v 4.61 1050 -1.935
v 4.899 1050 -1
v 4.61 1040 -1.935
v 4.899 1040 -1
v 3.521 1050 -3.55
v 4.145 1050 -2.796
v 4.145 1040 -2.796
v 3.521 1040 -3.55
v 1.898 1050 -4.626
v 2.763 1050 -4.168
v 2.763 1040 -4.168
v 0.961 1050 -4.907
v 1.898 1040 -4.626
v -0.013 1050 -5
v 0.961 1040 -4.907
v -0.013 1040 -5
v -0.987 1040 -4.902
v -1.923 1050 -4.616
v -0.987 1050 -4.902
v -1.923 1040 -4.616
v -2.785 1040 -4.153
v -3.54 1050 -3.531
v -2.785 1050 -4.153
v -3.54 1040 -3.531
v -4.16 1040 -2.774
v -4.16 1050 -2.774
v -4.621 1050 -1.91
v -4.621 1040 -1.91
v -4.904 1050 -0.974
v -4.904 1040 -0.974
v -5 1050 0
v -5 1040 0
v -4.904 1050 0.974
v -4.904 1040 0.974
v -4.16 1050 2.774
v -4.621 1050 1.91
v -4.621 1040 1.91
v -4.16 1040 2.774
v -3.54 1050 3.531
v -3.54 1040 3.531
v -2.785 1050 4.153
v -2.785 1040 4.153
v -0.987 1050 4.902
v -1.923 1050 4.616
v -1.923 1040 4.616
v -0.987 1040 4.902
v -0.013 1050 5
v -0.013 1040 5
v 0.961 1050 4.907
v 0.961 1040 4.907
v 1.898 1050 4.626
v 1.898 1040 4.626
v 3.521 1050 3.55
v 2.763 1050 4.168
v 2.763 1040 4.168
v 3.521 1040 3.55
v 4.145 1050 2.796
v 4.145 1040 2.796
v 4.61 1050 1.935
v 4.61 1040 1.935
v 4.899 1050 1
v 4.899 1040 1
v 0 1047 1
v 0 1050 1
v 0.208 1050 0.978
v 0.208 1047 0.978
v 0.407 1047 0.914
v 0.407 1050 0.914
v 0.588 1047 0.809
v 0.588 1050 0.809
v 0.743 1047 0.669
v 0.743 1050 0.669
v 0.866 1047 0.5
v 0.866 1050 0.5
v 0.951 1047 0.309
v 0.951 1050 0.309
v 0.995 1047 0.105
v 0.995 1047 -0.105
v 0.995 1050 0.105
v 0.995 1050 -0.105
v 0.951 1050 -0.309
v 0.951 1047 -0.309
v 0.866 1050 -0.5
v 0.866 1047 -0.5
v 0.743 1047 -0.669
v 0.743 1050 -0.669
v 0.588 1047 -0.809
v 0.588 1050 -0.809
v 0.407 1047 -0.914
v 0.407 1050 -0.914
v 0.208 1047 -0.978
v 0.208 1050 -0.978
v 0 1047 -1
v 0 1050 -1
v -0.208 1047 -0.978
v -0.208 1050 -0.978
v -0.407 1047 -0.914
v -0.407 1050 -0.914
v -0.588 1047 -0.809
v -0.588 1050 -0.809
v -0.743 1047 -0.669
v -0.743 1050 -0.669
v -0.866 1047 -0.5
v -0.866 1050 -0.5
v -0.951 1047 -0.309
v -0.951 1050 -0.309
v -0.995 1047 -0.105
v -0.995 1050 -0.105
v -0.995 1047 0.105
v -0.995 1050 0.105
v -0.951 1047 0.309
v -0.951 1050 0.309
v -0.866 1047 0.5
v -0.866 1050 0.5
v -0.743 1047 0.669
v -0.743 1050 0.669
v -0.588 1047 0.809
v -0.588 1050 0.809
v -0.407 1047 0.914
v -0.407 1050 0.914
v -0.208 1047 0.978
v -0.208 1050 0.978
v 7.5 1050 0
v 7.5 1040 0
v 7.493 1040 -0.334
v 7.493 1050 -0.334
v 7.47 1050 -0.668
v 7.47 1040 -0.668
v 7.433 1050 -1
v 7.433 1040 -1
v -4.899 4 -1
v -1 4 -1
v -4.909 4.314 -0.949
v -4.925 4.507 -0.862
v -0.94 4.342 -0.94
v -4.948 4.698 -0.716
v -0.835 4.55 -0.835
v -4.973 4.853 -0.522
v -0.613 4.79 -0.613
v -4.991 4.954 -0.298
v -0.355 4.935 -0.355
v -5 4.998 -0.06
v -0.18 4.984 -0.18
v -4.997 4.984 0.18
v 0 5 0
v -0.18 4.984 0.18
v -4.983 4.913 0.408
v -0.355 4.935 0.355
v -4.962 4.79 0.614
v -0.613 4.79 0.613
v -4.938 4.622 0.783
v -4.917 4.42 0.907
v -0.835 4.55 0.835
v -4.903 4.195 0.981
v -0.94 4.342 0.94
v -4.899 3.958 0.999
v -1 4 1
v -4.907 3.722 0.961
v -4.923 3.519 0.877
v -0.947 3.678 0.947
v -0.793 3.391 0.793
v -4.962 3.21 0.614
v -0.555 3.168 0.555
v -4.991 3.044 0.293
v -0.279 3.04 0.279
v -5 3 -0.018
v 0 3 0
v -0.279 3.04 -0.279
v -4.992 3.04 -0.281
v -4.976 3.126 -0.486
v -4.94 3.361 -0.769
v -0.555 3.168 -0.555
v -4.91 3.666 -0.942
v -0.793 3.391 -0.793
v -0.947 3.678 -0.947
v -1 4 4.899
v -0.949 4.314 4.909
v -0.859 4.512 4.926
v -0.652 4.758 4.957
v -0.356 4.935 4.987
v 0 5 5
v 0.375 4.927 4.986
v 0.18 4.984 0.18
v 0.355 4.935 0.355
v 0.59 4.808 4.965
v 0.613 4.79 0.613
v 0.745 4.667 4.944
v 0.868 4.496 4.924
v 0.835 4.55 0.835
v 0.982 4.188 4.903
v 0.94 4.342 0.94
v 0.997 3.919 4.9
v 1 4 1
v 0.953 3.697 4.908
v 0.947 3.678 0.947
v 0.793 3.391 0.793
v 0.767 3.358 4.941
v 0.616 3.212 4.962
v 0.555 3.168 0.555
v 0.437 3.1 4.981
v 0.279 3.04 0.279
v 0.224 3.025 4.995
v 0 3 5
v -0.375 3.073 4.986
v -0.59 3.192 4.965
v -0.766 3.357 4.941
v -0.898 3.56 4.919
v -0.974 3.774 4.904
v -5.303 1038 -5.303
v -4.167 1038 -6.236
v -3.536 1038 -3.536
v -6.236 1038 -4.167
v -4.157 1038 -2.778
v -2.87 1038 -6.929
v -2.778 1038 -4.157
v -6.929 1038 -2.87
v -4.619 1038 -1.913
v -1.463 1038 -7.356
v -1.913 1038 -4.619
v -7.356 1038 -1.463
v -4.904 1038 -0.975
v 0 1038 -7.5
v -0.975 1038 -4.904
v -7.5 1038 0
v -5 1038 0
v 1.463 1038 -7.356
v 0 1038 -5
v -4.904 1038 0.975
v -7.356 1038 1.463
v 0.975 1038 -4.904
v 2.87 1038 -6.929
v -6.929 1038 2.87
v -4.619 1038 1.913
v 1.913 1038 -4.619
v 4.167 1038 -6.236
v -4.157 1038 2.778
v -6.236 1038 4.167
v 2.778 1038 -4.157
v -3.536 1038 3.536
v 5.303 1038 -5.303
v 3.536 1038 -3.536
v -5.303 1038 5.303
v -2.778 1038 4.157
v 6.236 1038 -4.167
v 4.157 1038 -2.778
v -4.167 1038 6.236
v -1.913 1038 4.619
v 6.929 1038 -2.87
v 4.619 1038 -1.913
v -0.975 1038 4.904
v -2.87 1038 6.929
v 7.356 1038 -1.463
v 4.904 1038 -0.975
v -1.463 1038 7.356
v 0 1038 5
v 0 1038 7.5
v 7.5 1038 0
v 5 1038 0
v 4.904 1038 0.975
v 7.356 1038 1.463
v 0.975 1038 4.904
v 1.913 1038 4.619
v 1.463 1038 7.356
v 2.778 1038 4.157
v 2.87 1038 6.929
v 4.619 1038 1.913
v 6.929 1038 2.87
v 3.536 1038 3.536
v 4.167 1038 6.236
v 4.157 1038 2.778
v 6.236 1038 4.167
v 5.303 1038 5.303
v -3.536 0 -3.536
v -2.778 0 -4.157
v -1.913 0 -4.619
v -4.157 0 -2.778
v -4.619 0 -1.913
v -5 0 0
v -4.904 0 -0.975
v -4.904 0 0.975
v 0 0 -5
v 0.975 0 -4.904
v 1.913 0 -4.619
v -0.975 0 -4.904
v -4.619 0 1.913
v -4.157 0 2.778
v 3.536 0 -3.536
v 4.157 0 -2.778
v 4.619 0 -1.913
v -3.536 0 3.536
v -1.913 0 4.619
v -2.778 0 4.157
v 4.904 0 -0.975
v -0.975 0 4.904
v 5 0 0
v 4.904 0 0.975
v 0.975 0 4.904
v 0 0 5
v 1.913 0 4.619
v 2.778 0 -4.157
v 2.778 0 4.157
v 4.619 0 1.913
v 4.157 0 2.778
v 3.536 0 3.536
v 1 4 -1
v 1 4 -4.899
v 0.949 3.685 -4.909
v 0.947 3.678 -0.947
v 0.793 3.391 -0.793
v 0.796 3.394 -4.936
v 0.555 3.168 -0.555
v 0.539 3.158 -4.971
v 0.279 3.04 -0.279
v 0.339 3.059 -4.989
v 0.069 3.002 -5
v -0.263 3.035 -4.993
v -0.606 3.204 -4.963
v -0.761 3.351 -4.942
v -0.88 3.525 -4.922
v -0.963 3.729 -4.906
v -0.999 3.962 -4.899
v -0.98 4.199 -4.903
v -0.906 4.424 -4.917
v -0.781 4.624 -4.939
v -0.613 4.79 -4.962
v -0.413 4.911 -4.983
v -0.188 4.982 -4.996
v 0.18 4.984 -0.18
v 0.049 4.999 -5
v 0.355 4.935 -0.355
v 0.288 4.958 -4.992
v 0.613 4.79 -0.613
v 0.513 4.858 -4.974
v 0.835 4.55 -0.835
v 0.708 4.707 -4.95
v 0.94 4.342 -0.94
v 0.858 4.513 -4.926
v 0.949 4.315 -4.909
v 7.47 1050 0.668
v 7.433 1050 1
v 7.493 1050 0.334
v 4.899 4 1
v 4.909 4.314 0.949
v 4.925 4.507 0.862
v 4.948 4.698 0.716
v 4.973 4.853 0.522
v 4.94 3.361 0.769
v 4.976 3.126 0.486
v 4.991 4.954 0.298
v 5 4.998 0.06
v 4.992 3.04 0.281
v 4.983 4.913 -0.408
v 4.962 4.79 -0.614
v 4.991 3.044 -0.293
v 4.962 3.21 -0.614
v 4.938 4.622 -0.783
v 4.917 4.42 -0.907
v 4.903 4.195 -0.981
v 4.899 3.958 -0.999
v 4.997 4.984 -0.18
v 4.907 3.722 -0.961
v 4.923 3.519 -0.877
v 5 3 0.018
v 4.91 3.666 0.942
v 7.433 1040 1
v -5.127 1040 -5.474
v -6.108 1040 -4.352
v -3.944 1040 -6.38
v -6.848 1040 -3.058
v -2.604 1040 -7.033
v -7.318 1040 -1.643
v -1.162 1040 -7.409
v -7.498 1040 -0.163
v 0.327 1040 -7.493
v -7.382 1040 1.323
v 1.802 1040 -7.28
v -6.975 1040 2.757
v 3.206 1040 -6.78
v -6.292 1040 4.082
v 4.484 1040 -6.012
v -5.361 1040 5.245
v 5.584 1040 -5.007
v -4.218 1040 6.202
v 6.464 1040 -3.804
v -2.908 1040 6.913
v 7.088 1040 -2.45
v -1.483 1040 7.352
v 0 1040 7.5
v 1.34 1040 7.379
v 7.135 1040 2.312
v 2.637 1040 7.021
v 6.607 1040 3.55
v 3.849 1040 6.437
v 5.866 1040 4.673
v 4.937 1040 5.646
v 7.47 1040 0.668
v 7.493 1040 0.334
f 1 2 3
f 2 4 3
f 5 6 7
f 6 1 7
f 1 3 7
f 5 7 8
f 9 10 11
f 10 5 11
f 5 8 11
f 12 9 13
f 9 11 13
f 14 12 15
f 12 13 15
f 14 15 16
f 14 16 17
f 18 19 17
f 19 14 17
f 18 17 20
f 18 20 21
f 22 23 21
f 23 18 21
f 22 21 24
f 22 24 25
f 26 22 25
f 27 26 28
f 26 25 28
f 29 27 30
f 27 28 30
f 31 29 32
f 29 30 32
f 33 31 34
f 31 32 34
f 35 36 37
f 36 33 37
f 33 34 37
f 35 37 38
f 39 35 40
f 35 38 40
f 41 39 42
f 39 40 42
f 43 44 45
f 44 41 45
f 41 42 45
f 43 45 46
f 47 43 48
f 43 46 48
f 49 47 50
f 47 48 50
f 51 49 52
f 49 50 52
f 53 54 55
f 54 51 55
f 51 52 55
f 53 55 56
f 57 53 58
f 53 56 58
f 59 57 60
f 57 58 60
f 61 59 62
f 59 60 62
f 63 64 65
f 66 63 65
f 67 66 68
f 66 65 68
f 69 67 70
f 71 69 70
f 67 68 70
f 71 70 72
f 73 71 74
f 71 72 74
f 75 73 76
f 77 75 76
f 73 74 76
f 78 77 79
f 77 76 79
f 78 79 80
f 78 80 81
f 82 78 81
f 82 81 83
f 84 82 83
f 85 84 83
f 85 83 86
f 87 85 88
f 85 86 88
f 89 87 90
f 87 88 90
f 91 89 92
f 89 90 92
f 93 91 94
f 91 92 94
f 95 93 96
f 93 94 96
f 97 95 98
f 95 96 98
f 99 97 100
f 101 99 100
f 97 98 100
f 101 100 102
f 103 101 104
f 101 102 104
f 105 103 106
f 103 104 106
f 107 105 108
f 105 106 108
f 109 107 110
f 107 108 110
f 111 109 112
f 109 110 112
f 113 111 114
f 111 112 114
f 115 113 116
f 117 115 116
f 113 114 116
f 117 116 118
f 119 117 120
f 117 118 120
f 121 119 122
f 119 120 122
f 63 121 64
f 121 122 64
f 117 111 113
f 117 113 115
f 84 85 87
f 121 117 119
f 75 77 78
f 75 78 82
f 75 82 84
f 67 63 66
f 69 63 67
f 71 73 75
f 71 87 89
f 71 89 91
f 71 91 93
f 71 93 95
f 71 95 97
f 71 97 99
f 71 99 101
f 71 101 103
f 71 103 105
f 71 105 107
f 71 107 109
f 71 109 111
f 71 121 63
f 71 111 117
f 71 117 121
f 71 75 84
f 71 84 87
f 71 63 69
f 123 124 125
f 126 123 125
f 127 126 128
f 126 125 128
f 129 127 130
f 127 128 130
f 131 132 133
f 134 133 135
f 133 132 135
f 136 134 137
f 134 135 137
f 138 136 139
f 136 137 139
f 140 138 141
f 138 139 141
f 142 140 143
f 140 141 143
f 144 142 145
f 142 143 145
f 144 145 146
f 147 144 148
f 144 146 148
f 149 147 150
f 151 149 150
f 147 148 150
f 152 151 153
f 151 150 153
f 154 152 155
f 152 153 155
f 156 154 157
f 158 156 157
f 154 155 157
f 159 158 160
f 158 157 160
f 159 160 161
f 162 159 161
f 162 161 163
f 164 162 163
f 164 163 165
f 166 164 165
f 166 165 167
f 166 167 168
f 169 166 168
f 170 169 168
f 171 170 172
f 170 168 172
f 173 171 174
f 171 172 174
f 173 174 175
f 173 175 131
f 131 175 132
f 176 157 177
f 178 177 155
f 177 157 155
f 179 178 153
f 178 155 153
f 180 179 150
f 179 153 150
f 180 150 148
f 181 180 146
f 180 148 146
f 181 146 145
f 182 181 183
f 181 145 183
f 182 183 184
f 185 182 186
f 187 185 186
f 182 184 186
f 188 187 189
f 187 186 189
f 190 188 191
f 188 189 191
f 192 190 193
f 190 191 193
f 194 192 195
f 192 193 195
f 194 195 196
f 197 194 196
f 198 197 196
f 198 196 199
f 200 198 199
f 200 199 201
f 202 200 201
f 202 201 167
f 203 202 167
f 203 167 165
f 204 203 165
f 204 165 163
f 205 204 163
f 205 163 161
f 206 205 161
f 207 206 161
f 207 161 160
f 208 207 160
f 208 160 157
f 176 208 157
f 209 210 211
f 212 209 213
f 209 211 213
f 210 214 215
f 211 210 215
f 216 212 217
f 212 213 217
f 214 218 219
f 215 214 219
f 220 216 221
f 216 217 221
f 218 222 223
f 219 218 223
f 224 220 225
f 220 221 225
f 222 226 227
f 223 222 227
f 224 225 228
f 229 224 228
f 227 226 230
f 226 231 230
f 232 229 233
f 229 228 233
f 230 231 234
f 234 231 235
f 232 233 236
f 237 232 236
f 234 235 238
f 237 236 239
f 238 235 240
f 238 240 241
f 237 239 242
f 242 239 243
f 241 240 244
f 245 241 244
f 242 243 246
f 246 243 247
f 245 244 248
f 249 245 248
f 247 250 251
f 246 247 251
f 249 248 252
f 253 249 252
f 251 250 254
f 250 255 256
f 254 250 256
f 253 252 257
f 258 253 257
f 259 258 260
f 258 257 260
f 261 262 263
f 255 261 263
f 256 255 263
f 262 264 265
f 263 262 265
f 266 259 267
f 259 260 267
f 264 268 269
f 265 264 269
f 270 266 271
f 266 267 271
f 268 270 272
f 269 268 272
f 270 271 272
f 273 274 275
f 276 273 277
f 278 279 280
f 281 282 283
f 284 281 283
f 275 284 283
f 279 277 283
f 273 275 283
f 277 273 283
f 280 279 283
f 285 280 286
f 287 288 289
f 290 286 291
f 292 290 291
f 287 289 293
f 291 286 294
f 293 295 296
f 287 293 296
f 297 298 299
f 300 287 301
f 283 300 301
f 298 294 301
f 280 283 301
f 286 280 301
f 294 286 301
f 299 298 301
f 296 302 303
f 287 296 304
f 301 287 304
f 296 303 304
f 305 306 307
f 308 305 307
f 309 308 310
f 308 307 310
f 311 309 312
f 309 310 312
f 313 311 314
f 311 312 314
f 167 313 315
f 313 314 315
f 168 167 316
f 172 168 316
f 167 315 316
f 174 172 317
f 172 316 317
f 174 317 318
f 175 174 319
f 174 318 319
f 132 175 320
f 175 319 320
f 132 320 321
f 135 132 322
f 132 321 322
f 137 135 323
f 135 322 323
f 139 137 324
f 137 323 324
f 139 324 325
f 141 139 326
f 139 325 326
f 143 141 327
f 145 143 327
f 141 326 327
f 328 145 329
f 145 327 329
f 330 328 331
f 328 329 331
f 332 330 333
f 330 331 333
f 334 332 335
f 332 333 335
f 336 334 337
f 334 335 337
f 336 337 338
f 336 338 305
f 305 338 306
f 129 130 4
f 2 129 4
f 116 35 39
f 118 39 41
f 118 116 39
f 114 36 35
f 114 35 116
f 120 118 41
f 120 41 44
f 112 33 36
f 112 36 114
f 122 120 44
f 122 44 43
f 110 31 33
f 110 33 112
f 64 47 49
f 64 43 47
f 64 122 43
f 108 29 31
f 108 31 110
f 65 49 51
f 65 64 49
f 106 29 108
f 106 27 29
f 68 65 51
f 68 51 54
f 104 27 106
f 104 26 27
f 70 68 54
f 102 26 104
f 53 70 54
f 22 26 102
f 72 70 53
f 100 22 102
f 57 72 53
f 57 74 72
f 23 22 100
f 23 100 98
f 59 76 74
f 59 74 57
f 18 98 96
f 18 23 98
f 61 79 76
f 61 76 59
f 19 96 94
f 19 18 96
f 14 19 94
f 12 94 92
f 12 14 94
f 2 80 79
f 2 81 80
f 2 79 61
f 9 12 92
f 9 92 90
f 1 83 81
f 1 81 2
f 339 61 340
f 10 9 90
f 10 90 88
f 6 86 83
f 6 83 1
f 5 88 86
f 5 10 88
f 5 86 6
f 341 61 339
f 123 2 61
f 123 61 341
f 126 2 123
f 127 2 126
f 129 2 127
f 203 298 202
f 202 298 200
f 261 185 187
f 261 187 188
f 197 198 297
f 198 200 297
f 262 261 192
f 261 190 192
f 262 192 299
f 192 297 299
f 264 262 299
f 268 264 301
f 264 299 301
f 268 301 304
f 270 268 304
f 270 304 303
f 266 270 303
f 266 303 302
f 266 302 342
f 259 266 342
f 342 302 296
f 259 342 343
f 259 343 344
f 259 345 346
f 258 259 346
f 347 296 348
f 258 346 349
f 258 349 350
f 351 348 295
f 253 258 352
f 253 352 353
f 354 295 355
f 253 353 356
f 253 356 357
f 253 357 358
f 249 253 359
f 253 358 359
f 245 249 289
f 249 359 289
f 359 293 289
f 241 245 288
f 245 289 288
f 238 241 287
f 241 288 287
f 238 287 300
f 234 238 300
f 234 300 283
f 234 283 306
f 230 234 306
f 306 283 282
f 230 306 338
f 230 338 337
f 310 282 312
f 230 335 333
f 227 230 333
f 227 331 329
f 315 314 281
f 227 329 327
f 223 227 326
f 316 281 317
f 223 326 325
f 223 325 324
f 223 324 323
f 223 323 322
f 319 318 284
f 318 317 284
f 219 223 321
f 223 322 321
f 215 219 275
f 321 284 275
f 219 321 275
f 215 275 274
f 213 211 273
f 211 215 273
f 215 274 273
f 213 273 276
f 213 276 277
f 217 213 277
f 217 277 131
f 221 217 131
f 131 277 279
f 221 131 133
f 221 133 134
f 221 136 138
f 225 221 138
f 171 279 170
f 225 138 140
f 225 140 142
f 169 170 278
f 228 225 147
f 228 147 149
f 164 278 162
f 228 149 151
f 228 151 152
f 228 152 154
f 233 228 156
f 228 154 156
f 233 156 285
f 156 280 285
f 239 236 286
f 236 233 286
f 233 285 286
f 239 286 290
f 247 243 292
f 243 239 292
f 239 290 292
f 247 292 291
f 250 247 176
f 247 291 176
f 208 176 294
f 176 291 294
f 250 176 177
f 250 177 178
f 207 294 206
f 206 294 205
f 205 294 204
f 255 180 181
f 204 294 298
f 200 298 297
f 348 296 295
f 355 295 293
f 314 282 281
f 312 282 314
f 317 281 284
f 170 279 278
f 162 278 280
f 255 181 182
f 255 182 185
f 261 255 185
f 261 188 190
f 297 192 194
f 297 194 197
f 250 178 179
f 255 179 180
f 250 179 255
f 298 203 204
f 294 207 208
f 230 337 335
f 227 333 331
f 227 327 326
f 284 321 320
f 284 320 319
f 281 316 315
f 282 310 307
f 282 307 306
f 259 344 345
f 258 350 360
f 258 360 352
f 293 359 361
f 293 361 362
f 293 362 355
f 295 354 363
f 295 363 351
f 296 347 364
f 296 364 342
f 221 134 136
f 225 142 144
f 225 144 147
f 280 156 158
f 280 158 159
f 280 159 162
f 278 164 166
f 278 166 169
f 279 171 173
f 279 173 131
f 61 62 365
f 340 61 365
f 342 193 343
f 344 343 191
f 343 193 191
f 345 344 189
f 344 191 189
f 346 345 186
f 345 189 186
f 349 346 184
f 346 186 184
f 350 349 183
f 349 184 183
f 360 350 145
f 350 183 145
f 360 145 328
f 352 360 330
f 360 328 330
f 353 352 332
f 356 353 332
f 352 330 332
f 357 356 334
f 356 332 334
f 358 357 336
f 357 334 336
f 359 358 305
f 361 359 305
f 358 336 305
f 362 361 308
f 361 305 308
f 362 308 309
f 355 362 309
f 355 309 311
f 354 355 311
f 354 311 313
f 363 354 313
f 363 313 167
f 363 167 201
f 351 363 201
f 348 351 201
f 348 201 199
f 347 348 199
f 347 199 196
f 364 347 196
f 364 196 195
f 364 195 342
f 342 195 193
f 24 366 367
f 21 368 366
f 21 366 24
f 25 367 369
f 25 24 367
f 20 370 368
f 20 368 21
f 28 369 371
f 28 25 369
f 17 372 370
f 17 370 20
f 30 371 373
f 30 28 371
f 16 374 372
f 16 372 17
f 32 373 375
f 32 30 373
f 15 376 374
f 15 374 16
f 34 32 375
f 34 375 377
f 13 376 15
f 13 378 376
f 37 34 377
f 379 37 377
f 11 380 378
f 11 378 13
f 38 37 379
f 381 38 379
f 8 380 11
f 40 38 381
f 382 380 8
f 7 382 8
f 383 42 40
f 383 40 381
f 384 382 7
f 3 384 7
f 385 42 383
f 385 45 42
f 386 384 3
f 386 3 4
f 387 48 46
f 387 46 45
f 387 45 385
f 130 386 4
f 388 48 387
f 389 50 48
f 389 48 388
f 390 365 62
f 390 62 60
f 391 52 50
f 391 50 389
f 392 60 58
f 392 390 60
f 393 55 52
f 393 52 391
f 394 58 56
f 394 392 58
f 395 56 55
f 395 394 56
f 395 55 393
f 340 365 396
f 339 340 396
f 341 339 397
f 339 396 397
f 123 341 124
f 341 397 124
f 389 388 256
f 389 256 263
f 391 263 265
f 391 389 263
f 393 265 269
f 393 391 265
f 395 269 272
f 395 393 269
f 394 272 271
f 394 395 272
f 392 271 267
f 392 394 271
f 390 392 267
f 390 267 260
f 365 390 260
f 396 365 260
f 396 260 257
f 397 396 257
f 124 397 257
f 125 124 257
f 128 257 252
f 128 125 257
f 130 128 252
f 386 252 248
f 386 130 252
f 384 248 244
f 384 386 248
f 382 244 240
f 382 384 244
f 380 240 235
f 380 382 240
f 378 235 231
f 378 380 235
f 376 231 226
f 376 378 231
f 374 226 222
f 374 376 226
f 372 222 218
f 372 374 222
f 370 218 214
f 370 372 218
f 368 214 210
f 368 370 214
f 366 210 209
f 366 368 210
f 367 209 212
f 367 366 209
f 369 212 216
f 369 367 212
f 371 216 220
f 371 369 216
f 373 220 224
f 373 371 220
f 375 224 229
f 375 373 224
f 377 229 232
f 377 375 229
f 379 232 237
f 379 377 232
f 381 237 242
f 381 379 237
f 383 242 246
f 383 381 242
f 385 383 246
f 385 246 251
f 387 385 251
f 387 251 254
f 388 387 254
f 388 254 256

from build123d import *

# Parameters (mm, degrees)
SKETCH1_R           = 5
BOSS_EXTRUDE1_DEPTH = 1050
SKETCH2_R           = 7.5
BOSS_EXTRUDE2_DEPTH = 2
BOSS_EXTRUDE4_DEPTH = 10
SKETCH8_R           = 1
CUT_EXTRUDE1_DEPTH  = 3
SKETCH9_R           = 1
CUT_EXTRUDE2_DEPTH  = 10
CIRPATTERN1_COUNT   = 4


with BuildPart() as part:
    # Sketch1 → Boss-Extrude1 (new body)
    with BuildSketch(Plane(origin=(0, 0, 0), x_dir=(1, 0, 0), z_dir=(0, 1, 0))):
        with Locations(Location((0, 0, 0), (0, 0, 270))):
            Circle(SKETCH1_R)
    extrude(amount=BOSS_EXTRUDE1_DEPTH)

    # Sketch2 → Boss-Extrude2 (add)
    with BuildSketch(Plane(origin=(0, 1040, 0), x_dir=(1, 0, 0), z_dir=(0, 1, 0))):
        with Locations(Location((0, 0, 0), (0, 0, 270))):
            Circle(SKETCH2_R)
    extrude(amount=-BOSS_EXTRUDE2_DEPTH)

    # Sketch4 → Boss-Extrude4 (add)
    with BuildSketch(Plane(origin=(0, 1040, 0), x_dir=(1, 0, 0), z_dir=(0, 1, 0))):
        with BuildLine():
            ThreePointArc((4.898979486, 1), (4.974680765, 0.50254481), (5, 0))
            Line((5, 0), (7.5, 0))
            ThreePointArc((7.5, 0), (7.483239867, 0.501119845), (7.433034374, 1))
            Line((7.433034374, 1), (4.898979486, 1))
        make_face()
        with BuildLine():
            Line((7.5, 0), (5, 0))
            ThreePointArc((5, 0), (4.974680765, -0.50254481), (4.898979486, -1))
            Line((4.898979486, -1), (7.433034374, -1))
            ThreePointArc((7.433034374, -1), (7.483239867, -0.501119845), (7.5, 0))
        make_face()
    extrude(amount=BOSS_EXTRUDE4_DEPTH)

    # Sketch8 → Cut-Extrude1 (cut)
    with BuildSketch(Plane(origin=(0, 1050, 0), x_dir=(1, 0, 0), z_dir=(0, 1, 0))):
        with Locations(Location((0, 0, 0), (0, 0, 270))):
            Circle(SKETCH8_R)
    extrude(amount=-CUT_EXTRUDE1_DEPTH, mode=Mode.SUBTRACT)

    # Sketch9 → Cut-Extrude2 (cut)
    with BuildSketch(Plane.XY):
        with Locations((0, 4)):
            Circle(SKETCH9_R)
    cut_extrude2 = extrude(amount=-CUT_EXTRUDE2_DEPTH, mode=Mode.SUBTRACT)

    # CirPattern1: Cut-Extrude2 ×4 about axis
    cirpattern1_axis = Axis((0, 1050, 0), (0, -1, 0))
    for i in range(1, CIRPATTERN1_COUNT):
        add(cut_extrude2.rotate(cirpattern1_axis, i * 360 / CIRPATTERN1_COUNT), mode=Mode.SUBTRACT)


solid = part.part
